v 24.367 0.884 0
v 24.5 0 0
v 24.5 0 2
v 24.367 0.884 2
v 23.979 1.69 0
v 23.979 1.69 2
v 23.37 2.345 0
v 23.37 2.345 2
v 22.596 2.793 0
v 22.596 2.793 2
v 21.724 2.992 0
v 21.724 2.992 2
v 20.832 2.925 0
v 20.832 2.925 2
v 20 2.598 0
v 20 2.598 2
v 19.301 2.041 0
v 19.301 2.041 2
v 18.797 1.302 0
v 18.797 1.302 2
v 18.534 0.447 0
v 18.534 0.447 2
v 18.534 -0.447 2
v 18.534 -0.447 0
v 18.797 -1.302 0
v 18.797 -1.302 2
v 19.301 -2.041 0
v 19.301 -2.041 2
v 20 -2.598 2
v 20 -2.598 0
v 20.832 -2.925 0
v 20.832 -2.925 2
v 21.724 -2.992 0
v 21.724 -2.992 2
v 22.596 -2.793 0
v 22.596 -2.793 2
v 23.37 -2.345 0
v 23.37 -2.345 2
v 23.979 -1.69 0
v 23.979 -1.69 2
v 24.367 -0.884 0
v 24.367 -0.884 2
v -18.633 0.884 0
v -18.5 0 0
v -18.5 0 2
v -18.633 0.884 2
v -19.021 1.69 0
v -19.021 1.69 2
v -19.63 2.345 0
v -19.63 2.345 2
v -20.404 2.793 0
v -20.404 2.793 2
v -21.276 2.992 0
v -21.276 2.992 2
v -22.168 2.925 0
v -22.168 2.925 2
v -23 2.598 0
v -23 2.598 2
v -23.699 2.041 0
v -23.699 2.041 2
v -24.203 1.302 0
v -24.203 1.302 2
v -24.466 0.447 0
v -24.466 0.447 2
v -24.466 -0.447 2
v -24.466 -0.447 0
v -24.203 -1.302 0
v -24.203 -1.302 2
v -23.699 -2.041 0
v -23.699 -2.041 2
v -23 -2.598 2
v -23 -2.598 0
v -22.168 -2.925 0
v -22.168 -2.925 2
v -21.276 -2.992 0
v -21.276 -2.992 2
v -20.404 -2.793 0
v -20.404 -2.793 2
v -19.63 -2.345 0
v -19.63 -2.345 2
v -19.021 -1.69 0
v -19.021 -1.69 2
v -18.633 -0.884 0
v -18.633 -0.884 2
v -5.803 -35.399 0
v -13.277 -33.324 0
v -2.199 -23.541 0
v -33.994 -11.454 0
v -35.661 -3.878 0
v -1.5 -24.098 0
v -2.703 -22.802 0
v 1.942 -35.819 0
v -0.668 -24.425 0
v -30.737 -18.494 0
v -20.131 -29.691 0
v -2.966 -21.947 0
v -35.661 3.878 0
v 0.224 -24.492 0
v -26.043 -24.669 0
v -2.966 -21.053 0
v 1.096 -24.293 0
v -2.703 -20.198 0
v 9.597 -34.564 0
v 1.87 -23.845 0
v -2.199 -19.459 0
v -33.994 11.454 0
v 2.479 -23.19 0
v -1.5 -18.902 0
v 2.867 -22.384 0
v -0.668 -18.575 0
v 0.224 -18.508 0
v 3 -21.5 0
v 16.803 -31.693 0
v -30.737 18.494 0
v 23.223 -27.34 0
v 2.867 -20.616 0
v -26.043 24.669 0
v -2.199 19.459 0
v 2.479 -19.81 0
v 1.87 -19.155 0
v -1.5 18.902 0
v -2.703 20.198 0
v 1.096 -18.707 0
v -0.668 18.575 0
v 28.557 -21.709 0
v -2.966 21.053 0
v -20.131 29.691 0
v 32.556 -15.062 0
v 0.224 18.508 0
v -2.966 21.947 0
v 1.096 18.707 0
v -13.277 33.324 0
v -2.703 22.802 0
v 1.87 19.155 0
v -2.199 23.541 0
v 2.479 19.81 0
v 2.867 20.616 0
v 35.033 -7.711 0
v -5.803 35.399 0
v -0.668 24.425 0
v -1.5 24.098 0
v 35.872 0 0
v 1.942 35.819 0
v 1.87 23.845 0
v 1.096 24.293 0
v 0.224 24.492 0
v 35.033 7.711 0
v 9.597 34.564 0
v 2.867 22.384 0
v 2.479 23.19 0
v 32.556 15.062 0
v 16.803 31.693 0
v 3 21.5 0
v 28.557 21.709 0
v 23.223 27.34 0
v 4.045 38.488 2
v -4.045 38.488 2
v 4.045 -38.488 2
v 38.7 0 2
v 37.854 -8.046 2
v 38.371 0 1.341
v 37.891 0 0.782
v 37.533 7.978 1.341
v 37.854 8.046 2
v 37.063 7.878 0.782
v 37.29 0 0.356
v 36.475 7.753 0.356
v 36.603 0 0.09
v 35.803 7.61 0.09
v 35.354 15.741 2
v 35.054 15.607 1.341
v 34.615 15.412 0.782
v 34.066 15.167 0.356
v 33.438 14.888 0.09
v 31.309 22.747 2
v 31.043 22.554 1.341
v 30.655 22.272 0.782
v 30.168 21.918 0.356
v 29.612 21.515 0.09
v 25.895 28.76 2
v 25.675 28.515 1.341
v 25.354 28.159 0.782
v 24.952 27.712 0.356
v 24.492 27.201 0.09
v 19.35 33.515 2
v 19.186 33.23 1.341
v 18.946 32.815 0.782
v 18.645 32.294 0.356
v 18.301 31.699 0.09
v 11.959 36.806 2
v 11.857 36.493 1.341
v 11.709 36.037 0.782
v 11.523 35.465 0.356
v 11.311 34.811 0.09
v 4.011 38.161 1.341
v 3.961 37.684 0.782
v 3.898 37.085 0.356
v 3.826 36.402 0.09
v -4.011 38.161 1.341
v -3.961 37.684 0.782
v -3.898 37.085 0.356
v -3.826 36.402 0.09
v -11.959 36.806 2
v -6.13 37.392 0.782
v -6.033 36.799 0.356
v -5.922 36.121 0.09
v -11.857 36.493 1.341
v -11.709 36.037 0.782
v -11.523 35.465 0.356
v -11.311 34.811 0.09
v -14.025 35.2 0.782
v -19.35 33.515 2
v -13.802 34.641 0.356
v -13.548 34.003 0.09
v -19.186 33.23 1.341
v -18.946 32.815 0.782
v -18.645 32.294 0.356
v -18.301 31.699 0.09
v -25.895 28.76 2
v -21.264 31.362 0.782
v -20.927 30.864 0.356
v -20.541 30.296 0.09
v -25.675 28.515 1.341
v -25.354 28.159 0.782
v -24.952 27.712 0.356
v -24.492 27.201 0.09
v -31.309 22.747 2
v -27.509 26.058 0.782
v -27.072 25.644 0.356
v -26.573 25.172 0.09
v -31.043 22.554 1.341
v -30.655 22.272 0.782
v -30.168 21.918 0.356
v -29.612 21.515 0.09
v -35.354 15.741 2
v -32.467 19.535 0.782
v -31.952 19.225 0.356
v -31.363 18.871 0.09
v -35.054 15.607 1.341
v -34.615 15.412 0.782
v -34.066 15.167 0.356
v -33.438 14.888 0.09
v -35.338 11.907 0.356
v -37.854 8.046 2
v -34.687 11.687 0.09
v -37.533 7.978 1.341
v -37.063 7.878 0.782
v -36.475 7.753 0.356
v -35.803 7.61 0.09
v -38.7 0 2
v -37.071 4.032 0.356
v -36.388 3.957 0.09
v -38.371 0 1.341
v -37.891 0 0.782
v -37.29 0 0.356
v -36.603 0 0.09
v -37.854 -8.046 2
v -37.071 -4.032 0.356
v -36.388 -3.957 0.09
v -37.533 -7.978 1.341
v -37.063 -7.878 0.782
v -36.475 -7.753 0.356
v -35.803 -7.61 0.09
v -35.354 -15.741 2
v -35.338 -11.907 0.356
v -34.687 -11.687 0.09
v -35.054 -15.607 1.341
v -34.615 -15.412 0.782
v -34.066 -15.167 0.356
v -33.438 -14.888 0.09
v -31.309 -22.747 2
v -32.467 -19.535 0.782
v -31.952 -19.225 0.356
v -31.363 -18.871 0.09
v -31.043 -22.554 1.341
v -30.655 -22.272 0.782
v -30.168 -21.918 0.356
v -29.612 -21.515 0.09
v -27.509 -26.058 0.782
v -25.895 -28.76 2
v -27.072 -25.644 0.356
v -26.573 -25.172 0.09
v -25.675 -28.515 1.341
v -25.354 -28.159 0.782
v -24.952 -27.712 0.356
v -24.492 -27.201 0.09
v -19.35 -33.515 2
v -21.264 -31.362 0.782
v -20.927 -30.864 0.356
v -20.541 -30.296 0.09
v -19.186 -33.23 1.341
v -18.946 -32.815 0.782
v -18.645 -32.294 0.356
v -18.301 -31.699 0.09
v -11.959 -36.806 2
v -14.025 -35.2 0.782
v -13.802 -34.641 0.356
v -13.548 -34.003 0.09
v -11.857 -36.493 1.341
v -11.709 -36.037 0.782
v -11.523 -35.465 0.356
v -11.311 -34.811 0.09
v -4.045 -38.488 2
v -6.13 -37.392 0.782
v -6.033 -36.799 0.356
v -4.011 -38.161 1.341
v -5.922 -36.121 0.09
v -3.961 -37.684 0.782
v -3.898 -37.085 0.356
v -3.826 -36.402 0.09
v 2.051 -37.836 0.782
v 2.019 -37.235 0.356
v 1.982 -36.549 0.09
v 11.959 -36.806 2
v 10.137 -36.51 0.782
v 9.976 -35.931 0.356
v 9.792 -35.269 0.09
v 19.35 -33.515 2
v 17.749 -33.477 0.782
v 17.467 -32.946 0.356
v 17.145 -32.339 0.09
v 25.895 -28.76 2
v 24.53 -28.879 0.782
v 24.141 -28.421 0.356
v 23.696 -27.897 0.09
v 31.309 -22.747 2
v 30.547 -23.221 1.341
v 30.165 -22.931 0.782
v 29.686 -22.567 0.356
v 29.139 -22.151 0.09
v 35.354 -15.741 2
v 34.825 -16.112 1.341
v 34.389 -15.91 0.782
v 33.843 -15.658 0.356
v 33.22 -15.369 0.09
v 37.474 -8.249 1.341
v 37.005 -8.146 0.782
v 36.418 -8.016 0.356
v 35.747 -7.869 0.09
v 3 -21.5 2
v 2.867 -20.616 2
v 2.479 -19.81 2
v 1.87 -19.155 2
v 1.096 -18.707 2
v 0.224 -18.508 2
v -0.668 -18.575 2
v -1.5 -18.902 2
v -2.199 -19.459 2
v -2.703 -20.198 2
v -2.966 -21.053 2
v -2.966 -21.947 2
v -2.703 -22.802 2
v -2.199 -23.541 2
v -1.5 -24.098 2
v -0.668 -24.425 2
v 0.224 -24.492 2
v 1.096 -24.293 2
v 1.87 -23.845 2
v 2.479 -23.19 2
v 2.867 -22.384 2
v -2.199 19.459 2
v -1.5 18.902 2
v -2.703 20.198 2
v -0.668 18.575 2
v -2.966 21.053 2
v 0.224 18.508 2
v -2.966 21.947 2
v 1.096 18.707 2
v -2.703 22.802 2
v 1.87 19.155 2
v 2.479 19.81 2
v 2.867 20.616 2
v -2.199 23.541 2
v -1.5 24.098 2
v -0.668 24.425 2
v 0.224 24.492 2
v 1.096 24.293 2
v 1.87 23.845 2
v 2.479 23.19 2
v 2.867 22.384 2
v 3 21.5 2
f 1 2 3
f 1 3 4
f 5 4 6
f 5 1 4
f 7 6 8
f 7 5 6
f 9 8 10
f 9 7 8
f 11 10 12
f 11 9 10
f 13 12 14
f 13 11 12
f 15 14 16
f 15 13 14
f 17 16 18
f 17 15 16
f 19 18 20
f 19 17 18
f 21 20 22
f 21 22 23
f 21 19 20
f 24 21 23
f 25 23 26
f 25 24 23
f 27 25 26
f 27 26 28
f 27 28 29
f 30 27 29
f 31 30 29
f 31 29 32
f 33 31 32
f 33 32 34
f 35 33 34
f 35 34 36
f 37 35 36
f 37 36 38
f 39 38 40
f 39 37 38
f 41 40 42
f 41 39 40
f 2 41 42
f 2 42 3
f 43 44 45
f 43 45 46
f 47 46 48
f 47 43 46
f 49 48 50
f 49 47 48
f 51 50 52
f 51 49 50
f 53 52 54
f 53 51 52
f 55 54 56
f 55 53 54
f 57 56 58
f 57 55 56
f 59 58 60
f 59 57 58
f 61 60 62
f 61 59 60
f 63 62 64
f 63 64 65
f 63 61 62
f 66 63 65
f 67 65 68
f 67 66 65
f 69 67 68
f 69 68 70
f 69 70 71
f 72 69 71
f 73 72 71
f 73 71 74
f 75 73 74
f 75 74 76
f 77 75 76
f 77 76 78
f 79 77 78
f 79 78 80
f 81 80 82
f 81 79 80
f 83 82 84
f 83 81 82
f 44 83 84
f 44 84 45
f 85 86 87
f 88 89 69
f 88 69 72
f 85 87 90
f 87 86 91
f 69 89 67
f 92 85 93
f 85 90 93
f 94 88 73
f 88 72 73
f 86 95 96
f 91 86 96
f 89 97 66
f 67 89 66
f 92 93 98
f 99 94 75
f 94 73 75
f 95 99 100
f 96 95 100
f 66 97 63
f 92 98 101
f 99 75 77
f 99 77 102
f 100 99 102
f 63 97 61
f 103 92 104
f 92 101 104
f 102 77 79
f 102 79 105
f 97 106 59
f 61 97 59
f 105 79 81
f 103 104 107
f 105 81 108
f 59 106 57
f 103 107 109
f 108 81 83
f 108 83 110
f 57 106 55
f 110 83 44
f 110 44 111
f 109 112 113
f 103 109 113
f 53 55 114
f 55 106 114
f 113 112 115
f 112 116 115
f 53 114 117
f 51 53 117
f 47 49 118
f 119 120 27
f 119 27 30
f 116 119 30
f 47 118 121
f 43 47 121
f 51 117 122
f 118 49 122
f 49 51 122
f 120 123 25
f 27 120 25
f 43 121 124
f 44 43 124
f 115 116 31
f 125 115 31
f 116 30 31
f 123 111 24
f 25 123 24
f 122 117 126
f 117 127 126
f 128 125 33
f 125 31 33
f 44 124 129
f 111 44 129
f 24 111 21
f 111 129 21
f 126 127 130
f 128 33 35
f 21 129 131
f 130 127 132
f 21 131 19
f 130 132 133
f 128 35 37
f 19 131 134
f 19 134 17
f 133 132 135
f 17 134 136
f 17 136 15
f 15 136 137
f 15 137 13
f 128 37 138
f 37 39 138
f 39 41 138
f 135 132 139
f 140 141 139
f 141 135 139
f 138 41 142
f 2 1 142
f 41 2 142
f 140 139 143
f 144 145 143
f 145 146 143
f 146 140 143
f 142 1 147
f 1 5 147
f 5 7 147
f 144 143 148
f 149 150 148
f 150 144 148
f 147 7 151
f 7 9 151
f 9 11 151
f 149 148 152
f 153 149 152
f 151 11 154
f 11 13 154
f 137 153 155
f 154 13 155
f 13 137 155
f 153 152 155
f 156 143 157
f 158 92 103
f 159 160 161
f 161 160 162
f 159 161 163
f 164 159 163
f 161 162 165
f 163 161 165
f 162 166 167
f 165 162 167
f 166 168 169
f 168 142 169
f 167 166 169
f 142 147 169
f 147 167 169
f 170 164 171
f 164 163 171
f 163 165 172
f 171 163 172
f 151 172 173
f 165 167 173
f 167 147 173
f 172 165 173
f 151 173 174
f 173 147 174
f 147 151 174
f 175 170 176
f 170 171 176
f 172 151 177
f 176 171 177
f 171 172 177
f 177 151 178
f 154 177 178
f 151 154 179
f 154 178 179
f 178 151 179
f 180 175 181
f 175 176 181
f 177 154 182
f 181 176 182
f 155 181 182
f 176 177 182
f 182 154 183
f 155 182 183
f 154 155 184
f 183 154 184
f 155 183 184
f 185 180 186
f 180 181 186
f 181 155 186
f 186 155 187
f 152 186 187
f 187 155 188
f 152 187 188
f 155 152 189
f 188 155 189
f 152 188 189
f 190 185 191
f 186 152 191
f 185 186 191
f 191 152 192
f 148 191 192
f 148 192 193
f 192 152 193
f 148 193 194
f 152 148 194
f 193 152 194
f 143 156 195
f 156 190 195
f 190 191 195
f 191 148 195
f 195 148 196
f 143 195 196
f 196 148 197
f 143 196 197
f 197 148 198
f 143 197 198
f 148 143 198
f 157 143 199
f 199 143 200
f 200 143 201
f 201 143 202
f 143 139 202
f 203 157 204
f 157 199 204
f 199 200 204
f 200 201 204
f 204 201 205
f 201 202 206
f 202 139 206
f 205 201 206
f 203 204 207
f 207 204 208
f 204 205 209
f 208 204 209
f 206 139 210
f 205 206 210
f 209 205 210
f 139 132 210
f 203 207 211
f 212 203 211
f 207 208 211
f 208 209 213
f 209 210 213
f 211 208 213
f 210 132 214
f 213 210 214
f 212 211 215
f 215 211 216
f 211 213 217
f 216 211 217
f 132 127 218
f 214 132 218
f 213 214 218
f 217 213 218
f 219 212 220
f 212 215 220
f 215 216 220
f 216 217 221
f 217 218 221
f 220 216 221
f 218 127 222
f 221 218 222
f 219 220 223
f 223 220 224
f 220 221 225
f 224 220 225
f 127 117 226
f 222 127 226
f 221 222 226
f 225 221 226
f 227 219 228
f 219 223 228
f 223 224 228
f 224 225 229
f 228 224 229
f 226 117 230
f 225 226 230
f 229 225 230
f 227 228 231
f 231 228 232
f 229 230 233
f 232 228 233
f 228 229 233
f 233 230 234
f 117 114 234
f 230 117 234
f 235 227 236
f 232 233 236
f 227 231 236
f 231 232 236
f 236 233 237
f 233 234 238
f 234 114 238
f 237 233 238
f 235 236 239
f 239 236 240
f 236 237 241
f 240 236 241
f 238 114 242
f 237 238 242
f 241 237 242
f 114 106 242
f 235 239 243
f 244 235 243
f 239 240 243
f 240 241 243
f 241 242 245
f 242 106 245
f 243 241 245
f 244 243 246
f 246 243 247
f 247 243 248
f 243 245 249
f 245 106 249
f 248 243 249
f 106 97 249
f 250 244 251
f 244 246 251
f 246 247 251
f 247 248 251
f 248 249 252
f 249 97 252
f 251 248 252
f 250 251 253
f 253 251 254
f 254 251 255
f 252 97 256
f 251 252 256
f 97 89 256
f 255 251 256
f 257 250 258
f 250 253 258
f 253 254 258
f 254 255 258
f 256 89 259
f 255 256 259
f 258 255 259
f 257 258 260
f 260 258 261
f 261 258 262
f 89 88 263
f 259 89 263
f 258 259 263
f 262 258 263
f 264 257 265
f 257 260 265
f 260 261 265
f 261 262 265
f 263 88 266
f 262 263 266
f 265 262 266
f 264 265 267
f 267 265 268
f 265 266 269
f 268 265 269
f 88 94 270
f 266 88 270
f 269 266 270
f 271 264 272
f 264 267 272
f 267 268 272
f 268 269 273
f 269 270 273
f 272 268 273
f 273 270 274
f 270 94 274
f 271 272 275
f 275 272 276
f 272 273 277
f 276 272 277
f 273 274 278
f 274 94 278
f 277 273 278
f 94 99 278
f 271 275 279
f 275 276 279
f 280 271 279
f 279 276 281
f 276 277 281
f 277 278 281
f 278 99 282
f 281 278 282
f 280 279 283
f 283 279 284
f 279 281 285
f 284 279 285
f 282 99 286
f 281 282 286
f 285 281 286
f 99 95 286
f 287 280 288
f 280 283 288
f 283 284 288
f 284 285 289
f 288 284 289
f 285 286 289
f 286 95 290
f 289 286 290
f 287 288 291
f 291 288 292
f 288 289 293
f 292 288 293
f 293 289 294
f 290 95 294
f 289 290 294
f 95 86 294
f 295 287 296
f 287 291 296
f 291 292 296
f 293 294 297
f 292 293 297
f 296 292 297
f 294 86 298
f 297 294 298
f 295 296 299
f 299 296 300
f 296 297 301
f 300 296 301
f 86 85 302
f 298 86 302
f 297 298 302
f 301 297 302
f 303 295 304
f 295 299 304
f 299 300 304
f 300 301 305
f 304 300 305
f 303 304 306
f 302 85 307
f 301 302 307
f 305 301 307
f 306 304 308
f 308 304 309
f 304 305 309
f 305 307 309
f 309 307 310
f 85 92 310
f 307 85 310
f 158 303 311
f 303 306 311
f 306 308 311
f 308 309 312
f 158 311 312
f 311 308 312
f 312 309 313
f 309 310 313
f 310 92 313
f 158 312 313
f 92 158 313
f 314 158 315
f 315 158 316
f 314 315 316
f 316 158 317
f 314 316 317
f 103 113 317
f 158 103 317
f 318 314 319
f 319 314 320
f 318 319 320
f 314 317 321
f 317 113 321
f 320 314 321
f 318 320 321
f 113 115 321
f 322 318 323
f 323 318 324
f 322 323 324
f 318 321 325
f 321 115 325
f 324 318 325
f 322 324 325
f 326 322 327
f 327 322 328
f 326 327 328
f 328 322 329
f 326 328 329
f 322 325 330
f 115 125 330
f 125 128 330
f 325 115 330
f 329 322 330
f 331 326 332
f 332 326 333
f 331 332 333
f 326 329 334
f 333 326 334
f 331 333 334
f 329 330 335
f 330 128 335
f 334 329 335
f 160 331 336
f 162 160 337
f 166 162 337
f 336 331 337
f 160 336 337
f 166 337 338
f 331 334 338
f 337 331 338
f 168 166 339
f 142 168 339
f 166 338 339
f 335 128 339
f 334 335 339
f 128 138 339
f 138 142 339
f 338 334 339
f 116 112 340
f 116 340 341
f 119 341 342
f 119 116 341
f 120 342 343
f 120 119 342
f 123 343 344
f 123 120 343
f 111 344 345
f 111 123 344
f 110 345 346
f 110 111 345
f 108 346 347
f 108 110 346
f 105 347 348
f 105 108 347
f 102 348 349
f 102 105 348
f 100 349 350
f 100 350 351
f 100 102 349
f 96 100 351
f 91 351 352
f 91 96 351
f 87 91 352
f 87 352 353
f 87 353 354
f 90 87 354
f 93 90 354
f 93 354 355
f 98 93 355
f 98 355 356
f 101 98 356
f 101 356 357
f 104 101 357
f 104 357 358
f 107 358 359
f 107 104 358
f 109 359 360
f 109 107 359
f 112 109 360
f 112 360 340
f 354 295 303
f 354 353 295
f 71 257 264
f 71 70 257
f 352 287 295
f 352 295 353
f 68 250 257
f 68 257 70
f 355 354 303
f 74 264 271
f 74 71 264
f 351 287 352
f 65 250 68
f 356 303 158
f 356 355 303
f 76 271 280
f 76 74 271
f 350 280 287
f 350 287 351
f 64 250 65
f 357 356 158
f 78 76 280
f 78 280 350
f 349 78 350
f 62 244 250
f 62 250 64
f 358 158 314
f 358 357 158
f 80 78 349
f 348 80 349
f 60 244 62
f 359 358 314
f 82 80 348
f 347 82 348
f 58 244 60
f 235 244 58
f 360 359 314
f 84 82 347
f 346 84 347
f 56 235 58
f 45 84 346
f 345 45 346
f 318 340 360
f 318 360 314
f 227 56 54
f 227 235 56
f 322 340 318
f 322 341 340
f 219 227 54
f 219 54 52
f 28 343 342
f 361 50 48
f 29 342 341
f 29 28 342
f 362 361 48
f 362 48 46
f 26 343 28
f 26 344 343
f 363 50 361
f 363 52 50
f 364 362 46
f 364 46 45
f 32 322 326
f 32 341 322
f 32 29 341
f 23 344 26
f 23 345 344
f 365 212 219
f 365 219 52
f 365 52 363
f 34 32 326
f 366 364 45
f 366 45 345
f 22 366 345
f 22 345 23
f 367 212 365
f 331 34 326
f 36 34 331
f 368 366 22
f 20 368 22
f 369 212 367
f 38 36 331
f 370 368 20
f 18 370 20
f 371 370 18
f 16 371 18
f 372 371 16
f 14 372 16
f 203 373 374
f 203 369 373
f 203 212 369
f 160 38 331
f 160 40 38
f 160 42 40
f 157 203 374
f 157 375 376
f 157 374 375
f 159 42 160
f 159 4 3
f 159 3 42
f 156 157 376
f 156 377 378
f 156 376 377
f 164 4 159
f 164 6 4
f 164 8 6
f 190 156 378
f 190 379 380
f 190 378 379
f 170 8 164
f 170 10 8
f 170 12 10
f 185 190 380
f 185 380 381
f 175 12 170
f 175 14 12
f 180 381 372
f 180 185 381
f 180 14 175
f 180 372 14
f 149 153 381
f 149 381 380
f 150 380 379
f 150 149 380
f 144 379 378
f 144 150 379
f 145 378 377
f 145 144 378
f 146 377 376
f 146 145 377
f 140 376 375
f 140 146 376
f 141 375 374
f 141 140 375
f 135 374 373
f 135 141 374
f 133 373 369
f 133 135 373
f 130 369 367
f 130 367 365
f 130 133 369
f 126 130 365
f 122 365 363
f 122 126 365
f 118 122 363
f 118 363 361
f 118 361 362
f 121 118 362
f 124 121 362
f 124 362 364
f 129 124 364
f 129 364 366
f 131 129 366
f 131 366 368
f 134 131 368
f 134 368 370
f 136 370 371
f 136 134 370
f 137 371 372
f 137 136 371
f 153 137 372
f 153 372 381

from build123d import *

# Parameters (mm, degrees)
F0_R     = 38.7
F0_R_2   = 3
F1_DEPTH = 2


# Not quite as in the source:
# - a fillet or chamfer that OpenCascade refuses, or shapes differently, is made with other operations: its cross-section is extruded or revolved along the edge and cut away or added


with BuildPart() as f1:
    # F0 (on Top) → F1 (new body)
    with BuildSketch(Plane.XY):
        Circle(F0_R)
        with Locations((0, -21.5)):
            Circle(F0_R_2, mode=Mode.SUBTRACT)
        with Locations((-21.5, 0)):
            Circle(F0_R_2, mode=Mode.SUBTRACT)
        with Locations((21.5, 0)):
            Circle(F0_R_2, mode=Mode.SUBTRACT)
        with Locations((0, 21.5)):
            Circle(F0_R_2, mode=Mode.SUBTRACT)
    extrude(amount=F1_DEPTH)

    # F2: fillet of radius 3 on 1 edges, made by hand

    # F2_s1 → F2_t2 (revolve, cut)
    with BuildSketch(Plane.XZ):
        with BuildLine():
            ThreePointArc((38.7, 2), (37.6036236828, 0.5505102572), (35.8715728753, 0))
            Line((35.8715728753, 0), (38.7, 0))
            Line((38.7, 0), (38.7, 2))
        make_face()
    revolve(axis=Axis((0, 0, 0), (0, 0, 1)), mode=Mode.SUBTRACT)


solid = f1.part
